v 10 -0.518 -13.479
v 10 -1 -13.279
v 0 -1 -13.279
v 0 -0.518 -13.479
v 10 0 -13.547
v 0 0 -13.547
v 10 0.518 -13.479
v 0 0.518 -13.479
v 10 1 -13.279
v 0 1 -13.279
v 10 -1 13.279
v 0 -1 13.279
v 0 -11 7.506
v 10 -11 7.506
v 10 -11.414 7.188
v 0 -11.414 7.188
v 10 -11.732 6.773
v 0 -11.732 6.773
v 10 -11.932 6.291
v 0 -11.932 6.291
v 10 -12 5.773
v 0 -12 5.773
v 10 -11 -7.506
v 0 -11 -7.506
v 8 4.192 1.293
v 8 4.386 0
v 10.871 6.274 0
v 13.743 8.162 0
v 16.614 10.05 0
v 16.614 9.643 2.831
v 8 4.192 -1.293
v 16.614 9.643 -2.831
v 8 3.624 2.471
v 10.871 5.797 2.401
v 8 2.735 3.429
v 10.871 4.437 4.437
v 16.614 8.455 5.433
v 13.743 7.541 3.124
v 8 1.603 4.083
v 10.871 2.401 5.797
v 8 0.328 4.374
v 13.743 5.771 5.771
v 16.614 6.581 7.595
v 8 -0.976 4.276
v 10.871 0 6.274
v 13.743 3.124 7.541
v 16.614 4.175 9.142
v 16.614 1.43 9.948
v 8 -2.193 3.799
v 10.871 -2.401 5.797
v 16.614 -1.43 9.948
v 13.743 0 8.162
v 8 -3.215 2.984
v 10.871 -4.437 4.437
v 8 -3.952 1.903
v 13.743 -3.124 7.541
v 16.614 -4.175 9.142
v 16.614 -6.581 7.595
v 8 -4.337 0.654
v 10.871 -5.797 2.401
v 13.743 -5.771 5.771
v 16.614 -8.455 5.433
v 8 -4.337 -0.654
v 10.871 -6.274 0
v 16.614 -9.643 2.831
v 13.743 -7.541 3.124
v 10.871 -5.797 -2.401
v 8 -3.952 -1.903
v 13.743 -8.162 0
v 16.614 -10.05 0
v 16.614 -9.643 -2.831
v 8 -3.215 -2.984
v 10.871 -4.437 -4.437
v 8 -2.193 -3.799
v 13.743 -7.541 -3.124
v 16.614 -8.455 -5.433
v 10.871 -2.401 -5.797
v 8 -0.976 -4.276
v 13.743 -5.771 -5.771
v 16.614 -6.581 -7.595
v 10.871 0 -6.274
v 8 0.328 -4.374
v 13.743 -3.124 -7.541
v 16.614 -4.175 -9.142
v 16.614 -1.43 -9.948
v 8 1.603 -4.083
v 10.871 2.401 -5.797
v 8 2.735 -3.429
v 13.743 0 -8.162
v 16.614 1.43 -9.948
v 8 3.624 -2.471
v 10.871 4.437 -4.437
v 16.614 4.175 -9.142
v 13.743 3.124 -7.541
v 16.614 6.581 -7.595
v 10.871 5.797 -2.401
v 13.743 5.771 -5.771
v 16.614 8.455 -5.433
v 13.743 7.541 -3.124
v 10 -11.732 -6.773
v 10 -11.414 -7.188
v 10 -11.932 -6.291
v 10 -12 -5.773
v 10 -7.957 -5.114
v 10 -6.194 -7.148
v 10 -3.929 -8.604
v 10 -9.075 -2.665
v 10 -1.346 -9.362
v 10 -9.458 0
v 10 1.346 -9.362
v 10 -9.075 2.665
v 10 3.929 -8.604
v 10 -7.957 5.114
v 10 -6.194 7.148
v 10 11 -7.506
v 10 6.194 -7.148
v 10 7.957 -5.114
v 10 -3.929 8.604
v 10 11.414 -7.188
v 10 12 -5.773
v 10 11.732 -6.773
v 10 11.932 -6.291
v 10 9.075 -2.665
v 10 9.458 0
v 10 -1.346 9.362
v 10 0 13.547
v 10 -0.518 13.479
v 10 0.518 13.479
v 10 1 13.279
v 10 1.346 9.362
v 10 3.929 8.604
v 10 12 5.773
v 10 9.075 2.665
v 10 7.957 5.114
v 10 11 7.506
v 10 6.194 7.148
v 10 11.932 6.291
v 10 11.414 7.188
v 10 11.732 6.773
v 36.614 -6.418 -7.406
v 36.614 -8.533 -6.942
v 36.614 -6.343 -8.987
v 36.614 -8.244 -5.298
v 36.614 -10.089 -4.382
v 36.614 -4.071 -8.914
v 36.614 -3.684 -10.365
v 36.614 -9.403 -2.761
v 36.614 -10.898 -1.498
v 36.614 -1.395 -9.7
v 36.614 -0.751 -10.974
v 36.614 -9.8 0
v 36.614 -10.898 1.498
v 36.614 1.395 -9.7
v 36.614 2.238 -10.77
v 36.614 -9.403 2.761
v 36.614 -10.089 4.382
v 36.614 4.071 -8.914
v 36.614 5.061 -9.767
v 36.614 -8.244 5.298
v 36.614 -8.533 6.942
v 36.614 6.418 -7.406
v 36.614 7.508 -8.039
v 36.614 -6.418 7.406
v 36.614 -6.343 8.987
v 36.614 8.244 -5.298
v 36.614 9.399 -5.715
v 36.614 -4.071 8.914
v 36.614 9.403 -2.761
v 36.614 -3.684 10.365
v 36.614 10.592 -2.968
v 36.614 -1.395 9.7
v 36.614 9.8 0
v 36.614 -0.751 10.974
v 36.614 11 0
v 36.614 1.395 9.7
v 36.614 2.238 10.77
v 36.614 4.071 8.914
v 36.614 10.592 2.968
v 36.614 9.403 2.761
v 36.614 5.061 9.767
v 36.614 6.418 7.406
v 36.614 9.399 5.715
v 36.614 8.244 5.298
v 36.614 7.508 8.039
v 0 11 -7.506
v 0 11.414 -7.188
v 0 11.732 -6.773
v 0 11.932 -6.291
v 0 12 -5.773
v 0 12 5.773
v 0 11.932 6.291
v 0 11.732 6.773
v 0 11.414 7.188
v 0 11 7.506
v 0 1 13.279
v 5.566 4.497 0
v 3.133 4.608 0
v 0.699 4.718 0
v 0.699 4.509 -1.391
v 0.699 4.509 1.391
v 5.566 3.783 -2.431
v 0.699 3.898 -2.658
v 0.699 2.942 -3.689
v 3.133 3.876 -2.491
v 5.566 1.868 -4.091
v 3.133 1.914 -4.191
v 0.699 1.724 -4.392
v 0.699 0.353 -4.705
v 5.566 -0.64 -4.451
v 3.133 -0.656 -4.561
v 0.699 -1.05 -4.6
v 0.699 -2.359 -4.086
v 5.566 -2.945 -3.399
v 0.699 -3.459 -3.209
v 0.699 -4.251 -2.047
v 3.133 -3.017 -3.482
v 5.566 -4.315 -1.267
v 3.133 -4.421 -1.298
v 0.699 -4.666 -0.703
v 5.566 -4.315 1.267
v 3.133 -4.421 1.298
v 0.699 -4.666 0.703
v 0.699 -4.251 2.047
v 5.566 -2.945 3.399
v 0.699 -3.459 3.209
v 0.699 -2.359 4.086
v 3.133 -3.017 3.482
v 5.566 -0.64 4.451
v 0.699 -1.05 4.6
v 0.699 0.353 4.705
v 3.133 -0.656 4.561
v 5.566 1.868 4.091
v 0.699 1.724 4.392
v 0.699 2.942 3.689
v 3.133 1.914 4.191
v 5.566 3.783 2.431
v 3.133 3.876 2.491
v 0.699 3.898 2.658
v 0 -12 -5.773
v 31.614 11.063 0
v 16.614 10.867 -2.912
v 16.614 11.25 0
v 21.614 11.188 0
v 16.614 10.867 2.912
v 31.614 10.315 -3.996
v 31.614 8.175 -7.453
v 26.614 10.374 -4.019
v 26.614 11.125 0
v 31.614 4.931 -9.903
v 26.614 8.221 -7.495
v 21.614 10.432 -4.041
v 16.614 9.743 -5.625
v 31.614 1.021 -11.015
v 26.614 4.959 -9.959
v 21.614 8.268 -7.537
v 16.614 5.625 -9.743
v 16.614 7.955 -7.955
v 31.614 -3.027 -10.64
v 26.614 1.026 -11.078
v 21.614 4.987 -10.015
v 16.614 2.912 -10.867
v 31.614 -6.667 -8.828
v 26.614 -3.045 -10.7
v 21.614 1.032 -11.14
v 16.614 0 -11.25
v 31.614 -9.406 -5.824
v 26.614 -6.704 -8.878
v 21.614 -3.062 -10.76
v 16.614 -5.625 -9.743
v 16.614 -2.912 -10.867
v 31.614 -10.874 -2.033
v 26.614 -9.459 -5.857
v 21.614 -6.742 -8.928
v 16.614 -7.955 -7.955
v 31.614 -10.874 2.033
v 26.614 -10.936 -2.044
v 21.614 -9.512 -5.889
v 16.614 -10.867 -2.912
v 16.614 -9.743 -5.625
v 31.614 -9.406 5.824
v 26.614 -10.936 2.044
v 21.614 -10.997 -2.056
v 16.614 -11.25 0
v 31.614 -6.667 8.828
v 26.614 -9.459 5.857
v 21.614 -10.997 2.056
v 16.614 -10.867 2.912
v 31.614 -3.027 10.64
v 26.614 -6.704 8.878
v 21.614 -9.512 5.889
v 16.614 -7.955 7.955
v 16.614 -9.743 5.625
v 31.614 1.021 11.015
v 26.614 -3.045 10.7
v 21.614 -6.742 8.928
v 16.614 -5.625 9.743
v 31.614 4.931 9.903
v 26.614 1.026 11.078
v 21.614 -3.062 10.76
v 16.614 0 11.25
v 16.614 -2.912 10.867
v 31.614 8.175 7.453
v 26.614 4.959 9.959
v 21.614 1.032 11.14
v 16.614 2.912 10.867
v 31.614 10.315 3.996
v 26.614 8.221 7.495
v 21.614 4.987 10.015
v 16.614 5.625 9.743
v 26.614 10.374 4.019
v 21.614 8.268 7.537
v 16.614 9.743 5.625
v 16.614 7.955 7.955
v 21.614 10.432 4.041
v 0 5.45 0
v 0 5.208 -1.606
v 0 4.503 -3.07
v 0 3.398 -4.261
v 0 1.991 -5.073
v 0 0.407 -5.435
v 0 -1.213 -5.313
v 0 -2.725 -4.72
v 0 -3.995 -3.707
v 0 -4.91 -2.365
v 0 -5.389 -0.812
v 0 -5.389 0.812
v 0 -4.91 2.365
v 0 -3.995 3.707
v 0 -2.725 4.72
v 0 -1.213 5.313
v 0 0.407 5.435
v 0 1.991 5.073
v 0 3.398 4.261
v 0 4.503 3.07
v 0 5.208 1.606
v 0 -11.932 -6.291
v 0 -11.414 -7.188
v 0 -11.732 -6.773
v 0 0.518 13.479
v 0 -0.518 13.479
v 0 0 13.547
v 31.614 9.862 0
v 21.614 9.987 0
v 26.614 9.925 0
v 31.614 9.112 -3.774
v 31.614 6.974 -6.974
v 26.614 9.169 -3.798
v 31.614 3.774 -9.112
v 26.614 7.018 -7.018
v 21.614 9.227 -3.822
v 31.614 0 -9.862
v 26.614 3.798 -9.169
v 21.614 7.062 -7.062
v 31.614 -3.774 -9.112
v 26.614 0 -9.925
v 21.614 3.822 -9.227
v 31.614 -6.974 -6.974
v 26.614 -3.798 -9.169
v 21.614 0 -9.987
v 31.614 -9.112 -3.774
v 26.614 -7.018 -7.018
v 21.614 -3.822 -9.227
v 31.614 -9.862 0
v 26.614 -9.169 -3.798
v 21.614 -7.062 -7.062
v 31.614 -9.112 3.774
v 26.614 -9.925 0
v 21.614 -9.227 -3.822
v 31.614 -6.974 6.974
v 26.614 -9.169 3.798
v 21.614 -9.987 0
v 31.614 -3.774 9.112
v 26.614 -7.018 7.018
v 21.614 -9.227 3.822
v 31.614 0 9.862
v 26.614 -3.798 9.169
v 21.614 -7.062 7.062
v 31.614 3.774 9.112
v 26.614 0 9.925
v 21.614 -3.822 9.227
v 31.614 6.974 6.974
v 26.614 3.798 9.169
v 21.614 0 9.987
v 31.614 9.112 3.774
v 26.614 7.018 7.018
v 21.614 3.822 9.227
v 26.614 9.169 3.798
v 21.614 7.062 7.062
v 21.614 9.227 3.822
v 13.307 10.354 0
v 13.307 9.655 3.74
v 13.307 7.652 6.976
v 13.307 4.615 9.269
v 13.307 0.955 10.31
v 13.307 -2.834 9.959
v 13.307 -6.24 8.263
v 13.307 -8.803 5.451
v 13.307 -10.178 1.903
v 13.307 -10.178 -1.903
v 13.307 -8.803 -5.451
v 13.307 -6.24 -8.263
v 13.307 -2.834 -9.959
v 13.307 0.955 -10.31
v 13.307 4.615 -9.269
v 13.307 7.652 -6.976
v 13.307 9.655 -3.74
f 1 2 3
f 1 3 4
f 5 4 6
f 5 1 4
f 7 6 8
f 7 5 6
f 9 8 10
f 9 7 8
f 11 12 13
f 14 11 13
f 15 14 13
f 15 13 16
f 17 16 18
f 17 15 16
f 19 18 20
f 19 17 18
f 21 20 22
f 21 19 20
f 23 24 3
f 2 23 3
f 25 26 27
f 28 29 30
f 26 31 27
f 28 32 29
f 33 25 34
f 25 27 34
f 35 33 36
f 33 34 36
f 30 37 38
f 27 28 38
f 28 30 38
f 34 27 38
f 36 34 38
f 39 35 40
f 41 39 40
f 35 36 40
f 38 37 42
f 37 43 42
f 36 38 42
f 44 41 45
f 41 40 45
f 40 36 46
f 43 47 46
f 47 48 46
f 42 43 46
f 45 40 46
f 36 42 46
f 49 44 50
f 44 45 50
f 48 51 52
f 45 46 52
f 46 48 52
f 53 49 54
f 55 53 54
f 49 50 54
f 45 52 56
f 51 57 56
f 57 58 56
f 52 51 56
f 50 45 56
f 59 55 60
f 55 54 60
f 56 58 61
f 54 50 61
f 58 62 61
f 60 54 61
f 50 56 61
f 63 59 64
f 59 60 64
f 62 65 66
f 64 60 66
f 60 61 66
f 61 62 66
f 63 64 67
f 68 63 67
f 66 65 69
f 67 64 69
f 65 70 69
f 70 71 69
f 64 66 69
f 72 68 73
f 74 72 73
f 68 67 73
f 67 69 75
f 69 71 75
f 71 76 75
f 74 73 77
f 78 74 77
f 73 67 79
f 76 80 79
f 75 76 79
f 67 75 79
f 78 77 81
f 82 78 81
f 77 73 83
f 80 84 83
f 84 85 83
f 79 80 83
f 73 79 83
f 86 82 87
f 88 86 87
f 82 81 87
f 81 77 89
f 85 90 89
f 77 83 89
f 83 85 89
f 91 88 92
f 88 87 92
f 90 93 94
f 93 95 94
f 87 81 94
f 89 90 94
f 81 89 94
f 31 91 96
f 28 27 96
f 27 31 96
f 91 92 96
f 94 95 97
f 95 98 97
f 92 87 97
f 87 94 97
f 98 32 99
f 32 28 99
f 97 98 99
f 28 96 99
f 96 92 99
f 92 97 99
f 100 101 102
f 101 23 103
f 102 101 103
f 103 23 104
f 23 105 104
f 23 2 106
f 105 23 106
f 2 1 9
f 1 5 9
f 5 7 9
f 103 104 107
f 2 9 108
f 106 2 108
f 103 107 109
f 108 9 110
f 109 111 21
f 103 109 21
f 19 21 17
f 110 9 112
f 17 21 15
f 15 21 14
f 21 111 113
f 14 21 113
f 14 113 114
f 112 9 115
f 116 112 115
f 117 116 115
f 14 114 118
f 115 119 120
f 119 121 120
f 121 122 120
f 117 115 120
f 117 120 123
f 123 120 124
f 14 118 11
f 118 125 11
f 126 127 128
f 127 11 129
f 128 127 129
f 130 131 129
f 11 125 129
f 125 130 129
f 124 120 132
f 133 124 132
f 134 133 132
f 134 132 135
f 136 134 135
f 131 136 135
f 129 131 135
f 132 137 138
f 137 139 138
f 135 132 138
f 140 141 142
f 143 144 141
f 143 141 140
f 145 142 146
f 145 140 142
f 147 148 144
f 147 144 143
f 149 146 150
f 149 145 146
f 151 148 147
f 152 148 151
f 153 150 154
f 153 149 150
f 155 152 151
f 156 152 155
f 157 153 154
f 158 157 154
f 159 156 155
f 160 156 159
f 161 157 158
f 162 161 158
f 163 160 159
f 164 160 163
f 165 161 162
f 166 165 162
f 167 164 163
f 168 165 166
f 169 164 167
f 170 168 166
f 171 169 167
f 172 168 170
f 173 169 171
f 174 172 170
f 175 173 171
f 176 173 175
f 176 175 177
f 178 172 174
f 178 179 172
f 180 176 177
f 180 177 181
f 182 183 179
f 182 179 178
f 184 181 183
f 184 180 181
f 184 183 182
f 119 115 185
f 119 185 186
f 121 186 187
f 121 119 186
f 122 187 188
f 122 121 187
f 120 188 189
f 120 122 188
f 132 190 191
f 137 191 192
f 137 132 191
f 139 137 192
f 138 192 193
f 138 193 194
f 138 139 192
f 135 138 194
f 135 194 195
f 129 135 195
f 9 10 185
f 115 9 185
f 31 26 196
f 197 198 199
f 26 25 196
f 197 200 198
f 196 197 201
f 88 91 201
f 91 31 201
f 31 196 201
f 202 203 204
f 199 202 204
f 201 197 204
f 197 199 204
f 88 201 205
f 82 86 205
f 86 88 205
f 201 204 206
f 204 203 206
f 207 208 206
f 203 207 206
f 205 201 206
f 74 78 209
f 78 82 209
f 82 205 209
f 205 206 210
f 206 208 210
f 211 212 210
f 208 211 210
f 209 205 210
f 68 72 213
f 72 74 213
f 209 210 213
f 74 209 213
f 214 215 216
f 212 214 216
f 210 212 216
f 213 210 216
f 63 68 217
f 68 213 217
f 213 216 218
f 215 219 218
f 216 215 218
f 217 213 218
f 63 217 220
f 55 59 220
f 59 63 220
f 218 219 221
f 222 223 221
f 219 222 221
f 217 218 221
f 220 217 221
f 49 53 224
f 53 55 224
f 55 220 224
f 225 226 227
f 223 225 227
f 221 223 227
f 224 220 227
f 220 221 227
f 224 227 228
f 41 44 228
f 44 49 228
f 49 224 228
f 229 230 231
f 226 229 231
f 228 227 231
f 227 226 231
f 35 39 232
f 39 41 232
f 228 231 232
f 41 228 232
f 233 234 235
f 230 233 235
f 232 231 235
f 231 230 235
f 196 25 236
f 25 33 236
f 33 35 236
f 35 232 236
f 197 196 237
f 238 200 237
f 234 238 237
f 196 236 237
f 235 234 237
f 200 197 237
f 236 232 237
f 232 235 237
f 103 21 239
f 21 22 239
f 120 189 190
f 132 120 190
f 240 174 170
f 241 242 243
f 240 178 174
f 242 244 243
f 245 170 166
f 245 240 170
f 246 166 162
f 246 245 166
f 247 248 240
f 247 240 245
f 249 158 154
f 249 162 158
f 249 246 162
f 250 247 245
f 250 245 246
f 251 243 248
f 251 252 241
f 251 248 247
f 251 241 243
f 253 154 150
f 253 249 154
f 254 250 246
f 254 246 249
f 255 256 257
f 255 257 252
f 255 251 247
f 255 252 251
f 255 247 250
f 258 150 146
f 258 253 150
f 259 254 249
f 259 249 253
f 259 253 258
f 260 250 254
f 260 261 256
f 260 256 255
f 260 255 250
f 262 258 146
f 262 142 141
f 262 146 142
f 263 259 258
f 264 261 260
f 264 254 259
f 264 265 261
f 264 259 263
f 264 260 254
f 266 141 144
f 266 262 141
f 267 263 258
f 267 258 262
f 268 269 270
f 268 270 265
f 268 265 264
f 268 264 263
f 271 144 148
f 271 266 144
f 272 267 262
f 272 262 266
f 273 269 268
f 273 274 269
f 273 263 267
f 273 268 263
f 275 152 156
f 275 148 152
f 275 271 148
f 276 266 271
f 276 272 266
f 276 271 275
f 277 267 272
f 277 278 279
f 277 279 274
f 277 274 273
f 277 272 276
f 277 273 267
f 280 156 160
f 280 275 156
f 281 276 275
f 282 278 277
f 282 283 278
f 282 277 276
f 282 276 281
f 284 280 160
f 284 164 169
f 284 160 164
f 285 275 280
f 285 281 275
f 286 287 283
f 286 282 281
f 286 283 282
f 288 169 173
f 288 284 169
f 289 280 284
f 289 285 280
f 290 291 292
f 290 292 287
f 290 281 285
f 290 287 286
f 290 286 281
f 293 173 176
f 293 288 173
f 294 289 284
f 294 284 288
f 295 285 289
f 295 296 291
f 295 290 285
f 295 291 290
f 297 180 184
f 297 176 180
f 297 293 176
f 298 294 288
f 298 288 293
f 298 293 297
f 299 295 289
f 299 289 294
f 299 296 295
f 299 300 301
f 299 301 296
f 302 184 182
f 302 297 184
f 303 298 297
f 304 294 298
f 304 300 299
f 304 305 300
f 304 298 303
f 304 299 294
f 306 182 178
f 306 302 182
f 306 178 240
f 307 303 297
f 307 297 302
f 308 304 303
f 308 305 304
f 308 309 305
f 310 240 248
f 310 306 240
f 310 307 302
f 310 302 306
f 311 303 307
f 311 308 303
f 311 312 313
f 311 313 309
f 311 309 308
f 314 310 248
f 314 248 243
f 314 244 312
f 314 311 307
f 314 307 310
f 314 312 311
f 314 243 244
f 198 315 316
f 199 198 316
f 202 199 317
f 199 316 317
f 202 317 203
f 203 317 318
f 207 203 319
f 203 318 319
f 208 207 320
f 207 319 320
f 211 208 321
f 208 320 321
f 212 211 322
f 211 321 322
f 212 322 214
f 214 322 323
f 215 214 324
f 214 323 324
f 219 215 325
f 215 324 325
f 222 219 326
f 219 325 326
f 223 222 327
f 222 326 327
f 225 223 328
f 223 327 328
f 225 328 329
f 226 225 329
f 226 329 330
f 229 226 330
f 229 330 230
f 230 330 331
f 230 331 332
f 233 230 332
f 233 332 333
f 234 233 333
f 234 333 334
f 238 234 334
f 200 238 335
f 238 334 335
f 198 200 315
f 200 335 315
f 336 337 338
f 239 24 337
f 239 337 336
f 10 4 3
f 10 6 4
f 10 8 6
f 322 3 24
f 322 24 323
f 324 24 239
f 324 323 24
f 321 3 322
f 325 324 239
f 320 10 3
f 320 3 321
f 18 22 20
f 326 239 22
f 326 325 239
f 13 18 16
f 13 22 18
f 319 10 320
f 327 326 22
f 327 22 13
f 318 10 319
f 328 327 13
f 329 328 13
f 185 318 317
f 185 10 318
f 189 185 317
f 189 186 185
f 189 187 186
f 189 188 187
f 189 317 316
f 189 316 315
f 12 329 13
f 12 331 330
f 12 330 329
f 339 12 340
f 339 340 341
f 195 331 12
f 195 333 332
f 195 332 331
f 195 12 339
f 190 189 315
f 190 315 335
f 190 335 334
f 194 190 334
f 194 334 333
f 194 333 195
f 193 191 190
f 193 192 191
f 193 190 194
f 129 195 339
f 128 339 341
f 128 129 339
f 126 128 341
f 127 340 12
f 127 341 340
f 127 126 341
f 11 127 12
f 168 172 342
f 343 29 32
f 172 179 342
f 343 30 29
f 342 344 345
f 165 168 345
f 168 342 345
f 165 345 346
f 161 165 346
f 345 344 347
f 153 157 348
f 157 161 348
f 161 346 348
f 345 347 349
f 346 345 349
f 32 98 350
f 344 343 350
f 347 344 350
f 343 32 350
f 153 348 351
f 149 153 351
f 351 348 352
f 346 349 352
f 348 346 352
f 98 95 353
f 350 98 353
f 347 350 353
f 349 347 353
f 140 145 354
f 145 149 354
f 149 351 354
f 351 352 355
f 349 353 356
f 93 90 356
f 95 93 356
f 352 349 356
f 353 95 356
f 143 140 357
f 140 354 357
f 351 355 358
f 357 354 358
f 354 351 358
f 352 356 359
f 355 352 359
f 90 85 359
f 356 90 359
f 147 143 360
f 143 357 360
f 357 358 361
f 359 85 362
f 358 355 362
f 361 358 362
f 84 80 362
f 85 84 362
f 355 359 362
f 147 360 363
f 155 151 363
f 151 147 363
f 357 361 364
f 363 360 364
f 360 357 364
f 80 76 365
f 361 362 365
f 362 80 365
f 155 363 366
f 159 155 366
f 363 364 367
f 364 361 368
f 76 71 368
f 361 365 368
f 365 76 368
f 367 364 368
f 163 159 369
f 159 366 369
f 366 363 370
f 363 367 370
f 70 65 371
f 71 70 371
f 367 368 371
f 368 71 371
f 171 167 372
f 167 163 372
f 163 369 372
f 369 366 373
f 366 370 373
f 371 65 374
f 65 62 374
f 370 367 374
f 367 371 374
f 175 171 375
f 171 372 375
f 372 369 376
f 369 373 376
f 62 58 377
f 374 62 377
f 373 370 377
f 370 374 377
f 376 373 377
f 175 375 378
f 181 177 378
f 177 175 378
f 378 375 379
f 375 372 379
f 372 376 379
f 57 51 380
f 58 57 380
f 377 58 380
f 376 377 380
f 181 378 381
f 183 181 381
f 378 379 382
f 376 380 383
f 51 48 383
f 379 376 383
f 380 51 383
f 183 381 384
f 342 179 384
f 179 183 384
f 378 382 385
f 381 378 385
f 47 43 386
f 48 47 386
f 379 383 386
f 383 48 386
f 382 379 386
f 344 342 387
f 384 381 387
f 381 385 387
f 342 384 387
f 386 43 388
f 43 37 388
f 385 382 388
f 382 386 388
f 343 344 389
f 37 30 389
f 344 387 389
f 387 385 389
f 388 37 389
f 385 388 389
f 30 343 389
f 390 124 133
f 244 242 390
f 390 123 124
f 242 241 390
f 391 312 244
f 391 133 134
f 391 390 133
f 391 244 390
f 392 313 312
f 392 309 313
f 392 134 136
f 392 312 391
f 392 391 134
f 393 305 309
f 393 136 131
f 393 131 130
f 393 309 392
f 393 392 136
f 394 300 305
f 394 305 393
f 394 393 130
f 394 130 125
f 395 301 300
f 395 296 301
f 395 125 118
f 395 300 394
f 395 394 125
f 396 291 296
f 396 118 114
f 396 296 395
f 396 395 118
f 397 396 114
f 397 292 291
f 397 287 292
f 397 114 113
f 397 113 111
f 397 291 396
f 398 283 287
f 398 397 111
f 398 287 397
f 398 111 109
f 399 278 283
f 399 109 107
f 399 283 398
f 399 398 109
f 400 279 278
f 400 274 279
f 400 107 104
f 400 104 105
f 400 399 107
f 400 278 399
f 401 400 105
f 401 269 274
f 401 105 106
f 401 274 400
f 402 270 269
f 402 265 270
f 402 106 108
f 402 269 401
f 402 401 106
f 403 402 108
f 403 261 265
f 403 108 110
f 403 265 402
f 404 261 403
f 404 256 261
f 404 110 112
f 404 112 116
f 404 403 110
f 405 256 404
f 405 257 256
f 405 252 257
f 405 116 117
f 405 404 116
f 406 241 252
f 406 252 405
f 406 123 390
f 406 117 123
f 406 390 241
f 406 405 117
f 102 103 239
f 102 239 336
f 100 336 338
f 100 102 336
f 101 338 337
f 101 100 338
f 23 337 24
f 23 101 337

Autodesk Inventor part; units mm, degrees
ref_plane "YZ Plane" through (0, 0, 0) normal (1, 0, 0) x (0, 1, 0)
ref_plane "XZ Plane" through (0, 0, 0) normal (0, 1, 0) x (-1, 0, 0)
ref_plane "XY Plane" through (0, 0, 0) normal (0, 0, 1) x (1, 0, 0)
sketch "Sketch1" plane through (0, 0, 0) normal (0, 0, 1) x (1, 0, 0)
  line L0 (0, 0) -> (6.6144, 0) construction
  line L1 (0, 0) -> (0, 4.75) construction
  line L2 (0, 4.75) -> (8, 4.3864)
  line L3 (6.6144, 0) -> (16.6144, 0) construction
  line L4 (16.6144, 0) -> (16.6144, 11.25) construction
  line L5 (16.6144, 0) -> (36.6144, 0) construction
  line L6 (36.6144, 0) -> (36.6144, 11) construction
  line L7 (36.6144, 11) -> (16.6144, 11.25)
  line L8 (0, 4.75) -> (0, 6.75)
  line L9 (0, 4.75) -> (2, 4.75) construction
  line L10 (0, 6.75) -> (16.6144, 11.25)
  line L11 (8, 4.3864) -> (16.6144, 10.05)
  line L12 (16.6144, 10.05) -> (36.6144, 9.7999)
  line L13 (36.6144, 9.7999) -> (36.6144, 11)
  line L14 (0, 0) -> (3.3, 0) construction
  line L15 (3.3, 0) -> (3.3, 4.6) construction
  dimension "d2" = 4.75
  dimension "d3" = 11.25
  dimension "d4" = 20
  dimension "d5" = 11
  dimension "d6" = 2
  dimension "d7" = 90
  dimension "d8" = 1.2
  dimension "d9" = 1.2
  dimension "d10" = 10
  dimension "d24" = 177.397
  dimension "d25" = 8
  dimension "d26" = 3.3
  dimension "d27" = 4.6
  dimension "d28" = 6.6144
revolve "Revolution1" add sketch "Sketch1" angle 360 about axis through (6.6144, 0, 0) along (1, 0, 0)
sketch "Sketch2" plane through (0, 0, 0) normal (-1, 0, 0) x (0, 0, 1)
  circle A0 centre (0, 0) radius 6.75 projected
  line L0 (0, -6.75) -> (0, -11.25) construction
  circle A1 centre (0, 0) radius 11.25 projected
  line L1 (1.633, -6.5495) -> (2.7216, -10.9158)
  line L2 (-1.633, -6.5495) -> (-2.7216, -10.9158)
  point P0 (-1.633, -6.5495)
  dimension "d12" = 14
extrude "Extrusion1" [suppressed]
chamfer "Chamfer1" [suppressed]
pattern_circular "Circular Pattern1" [suppressed]
chamfer "Chamfer2" distance 0.7 angle 45 1 edges at (0, -4.75, 0)
sketch "Sketch3" plane through (0, 0, 0) normal (-1, 0, 0) x (0, 0, 1)
  line L0 (-6.9282, -12) -> (-13.8564, 0)
  line L1 (-13.8564, 0) -> (-6.9282, 12)
  line L2 (-6.9282, 12) -> (6.9282, 12)
  line L3 (6.9282, 12) -> (13.8564, 0)
  line L4 (13.8564, 0) -> (6.9282, -12)
  line L5 (6.9282, -12) -> (-6.9282, -12)
  circle A0 centre (0, 0) radius 6.75 projected
  point P0 (0, -12)
  dimension "d32" = 24
extrude "Extrusion2" add sketch "Sketch3" against normal blind 10
fillet "Fillet1" radius 2 6 edges at (5, 12, 6.9282) (5, 12, -6.9282) (5, 0, -13.8564) (5, -12, -6.9282) (5, -12, 6.9282) (5, 0, 13.8564)
equation "\"Tol\" = 0"
properties part number "PneumaticAdaptor"
